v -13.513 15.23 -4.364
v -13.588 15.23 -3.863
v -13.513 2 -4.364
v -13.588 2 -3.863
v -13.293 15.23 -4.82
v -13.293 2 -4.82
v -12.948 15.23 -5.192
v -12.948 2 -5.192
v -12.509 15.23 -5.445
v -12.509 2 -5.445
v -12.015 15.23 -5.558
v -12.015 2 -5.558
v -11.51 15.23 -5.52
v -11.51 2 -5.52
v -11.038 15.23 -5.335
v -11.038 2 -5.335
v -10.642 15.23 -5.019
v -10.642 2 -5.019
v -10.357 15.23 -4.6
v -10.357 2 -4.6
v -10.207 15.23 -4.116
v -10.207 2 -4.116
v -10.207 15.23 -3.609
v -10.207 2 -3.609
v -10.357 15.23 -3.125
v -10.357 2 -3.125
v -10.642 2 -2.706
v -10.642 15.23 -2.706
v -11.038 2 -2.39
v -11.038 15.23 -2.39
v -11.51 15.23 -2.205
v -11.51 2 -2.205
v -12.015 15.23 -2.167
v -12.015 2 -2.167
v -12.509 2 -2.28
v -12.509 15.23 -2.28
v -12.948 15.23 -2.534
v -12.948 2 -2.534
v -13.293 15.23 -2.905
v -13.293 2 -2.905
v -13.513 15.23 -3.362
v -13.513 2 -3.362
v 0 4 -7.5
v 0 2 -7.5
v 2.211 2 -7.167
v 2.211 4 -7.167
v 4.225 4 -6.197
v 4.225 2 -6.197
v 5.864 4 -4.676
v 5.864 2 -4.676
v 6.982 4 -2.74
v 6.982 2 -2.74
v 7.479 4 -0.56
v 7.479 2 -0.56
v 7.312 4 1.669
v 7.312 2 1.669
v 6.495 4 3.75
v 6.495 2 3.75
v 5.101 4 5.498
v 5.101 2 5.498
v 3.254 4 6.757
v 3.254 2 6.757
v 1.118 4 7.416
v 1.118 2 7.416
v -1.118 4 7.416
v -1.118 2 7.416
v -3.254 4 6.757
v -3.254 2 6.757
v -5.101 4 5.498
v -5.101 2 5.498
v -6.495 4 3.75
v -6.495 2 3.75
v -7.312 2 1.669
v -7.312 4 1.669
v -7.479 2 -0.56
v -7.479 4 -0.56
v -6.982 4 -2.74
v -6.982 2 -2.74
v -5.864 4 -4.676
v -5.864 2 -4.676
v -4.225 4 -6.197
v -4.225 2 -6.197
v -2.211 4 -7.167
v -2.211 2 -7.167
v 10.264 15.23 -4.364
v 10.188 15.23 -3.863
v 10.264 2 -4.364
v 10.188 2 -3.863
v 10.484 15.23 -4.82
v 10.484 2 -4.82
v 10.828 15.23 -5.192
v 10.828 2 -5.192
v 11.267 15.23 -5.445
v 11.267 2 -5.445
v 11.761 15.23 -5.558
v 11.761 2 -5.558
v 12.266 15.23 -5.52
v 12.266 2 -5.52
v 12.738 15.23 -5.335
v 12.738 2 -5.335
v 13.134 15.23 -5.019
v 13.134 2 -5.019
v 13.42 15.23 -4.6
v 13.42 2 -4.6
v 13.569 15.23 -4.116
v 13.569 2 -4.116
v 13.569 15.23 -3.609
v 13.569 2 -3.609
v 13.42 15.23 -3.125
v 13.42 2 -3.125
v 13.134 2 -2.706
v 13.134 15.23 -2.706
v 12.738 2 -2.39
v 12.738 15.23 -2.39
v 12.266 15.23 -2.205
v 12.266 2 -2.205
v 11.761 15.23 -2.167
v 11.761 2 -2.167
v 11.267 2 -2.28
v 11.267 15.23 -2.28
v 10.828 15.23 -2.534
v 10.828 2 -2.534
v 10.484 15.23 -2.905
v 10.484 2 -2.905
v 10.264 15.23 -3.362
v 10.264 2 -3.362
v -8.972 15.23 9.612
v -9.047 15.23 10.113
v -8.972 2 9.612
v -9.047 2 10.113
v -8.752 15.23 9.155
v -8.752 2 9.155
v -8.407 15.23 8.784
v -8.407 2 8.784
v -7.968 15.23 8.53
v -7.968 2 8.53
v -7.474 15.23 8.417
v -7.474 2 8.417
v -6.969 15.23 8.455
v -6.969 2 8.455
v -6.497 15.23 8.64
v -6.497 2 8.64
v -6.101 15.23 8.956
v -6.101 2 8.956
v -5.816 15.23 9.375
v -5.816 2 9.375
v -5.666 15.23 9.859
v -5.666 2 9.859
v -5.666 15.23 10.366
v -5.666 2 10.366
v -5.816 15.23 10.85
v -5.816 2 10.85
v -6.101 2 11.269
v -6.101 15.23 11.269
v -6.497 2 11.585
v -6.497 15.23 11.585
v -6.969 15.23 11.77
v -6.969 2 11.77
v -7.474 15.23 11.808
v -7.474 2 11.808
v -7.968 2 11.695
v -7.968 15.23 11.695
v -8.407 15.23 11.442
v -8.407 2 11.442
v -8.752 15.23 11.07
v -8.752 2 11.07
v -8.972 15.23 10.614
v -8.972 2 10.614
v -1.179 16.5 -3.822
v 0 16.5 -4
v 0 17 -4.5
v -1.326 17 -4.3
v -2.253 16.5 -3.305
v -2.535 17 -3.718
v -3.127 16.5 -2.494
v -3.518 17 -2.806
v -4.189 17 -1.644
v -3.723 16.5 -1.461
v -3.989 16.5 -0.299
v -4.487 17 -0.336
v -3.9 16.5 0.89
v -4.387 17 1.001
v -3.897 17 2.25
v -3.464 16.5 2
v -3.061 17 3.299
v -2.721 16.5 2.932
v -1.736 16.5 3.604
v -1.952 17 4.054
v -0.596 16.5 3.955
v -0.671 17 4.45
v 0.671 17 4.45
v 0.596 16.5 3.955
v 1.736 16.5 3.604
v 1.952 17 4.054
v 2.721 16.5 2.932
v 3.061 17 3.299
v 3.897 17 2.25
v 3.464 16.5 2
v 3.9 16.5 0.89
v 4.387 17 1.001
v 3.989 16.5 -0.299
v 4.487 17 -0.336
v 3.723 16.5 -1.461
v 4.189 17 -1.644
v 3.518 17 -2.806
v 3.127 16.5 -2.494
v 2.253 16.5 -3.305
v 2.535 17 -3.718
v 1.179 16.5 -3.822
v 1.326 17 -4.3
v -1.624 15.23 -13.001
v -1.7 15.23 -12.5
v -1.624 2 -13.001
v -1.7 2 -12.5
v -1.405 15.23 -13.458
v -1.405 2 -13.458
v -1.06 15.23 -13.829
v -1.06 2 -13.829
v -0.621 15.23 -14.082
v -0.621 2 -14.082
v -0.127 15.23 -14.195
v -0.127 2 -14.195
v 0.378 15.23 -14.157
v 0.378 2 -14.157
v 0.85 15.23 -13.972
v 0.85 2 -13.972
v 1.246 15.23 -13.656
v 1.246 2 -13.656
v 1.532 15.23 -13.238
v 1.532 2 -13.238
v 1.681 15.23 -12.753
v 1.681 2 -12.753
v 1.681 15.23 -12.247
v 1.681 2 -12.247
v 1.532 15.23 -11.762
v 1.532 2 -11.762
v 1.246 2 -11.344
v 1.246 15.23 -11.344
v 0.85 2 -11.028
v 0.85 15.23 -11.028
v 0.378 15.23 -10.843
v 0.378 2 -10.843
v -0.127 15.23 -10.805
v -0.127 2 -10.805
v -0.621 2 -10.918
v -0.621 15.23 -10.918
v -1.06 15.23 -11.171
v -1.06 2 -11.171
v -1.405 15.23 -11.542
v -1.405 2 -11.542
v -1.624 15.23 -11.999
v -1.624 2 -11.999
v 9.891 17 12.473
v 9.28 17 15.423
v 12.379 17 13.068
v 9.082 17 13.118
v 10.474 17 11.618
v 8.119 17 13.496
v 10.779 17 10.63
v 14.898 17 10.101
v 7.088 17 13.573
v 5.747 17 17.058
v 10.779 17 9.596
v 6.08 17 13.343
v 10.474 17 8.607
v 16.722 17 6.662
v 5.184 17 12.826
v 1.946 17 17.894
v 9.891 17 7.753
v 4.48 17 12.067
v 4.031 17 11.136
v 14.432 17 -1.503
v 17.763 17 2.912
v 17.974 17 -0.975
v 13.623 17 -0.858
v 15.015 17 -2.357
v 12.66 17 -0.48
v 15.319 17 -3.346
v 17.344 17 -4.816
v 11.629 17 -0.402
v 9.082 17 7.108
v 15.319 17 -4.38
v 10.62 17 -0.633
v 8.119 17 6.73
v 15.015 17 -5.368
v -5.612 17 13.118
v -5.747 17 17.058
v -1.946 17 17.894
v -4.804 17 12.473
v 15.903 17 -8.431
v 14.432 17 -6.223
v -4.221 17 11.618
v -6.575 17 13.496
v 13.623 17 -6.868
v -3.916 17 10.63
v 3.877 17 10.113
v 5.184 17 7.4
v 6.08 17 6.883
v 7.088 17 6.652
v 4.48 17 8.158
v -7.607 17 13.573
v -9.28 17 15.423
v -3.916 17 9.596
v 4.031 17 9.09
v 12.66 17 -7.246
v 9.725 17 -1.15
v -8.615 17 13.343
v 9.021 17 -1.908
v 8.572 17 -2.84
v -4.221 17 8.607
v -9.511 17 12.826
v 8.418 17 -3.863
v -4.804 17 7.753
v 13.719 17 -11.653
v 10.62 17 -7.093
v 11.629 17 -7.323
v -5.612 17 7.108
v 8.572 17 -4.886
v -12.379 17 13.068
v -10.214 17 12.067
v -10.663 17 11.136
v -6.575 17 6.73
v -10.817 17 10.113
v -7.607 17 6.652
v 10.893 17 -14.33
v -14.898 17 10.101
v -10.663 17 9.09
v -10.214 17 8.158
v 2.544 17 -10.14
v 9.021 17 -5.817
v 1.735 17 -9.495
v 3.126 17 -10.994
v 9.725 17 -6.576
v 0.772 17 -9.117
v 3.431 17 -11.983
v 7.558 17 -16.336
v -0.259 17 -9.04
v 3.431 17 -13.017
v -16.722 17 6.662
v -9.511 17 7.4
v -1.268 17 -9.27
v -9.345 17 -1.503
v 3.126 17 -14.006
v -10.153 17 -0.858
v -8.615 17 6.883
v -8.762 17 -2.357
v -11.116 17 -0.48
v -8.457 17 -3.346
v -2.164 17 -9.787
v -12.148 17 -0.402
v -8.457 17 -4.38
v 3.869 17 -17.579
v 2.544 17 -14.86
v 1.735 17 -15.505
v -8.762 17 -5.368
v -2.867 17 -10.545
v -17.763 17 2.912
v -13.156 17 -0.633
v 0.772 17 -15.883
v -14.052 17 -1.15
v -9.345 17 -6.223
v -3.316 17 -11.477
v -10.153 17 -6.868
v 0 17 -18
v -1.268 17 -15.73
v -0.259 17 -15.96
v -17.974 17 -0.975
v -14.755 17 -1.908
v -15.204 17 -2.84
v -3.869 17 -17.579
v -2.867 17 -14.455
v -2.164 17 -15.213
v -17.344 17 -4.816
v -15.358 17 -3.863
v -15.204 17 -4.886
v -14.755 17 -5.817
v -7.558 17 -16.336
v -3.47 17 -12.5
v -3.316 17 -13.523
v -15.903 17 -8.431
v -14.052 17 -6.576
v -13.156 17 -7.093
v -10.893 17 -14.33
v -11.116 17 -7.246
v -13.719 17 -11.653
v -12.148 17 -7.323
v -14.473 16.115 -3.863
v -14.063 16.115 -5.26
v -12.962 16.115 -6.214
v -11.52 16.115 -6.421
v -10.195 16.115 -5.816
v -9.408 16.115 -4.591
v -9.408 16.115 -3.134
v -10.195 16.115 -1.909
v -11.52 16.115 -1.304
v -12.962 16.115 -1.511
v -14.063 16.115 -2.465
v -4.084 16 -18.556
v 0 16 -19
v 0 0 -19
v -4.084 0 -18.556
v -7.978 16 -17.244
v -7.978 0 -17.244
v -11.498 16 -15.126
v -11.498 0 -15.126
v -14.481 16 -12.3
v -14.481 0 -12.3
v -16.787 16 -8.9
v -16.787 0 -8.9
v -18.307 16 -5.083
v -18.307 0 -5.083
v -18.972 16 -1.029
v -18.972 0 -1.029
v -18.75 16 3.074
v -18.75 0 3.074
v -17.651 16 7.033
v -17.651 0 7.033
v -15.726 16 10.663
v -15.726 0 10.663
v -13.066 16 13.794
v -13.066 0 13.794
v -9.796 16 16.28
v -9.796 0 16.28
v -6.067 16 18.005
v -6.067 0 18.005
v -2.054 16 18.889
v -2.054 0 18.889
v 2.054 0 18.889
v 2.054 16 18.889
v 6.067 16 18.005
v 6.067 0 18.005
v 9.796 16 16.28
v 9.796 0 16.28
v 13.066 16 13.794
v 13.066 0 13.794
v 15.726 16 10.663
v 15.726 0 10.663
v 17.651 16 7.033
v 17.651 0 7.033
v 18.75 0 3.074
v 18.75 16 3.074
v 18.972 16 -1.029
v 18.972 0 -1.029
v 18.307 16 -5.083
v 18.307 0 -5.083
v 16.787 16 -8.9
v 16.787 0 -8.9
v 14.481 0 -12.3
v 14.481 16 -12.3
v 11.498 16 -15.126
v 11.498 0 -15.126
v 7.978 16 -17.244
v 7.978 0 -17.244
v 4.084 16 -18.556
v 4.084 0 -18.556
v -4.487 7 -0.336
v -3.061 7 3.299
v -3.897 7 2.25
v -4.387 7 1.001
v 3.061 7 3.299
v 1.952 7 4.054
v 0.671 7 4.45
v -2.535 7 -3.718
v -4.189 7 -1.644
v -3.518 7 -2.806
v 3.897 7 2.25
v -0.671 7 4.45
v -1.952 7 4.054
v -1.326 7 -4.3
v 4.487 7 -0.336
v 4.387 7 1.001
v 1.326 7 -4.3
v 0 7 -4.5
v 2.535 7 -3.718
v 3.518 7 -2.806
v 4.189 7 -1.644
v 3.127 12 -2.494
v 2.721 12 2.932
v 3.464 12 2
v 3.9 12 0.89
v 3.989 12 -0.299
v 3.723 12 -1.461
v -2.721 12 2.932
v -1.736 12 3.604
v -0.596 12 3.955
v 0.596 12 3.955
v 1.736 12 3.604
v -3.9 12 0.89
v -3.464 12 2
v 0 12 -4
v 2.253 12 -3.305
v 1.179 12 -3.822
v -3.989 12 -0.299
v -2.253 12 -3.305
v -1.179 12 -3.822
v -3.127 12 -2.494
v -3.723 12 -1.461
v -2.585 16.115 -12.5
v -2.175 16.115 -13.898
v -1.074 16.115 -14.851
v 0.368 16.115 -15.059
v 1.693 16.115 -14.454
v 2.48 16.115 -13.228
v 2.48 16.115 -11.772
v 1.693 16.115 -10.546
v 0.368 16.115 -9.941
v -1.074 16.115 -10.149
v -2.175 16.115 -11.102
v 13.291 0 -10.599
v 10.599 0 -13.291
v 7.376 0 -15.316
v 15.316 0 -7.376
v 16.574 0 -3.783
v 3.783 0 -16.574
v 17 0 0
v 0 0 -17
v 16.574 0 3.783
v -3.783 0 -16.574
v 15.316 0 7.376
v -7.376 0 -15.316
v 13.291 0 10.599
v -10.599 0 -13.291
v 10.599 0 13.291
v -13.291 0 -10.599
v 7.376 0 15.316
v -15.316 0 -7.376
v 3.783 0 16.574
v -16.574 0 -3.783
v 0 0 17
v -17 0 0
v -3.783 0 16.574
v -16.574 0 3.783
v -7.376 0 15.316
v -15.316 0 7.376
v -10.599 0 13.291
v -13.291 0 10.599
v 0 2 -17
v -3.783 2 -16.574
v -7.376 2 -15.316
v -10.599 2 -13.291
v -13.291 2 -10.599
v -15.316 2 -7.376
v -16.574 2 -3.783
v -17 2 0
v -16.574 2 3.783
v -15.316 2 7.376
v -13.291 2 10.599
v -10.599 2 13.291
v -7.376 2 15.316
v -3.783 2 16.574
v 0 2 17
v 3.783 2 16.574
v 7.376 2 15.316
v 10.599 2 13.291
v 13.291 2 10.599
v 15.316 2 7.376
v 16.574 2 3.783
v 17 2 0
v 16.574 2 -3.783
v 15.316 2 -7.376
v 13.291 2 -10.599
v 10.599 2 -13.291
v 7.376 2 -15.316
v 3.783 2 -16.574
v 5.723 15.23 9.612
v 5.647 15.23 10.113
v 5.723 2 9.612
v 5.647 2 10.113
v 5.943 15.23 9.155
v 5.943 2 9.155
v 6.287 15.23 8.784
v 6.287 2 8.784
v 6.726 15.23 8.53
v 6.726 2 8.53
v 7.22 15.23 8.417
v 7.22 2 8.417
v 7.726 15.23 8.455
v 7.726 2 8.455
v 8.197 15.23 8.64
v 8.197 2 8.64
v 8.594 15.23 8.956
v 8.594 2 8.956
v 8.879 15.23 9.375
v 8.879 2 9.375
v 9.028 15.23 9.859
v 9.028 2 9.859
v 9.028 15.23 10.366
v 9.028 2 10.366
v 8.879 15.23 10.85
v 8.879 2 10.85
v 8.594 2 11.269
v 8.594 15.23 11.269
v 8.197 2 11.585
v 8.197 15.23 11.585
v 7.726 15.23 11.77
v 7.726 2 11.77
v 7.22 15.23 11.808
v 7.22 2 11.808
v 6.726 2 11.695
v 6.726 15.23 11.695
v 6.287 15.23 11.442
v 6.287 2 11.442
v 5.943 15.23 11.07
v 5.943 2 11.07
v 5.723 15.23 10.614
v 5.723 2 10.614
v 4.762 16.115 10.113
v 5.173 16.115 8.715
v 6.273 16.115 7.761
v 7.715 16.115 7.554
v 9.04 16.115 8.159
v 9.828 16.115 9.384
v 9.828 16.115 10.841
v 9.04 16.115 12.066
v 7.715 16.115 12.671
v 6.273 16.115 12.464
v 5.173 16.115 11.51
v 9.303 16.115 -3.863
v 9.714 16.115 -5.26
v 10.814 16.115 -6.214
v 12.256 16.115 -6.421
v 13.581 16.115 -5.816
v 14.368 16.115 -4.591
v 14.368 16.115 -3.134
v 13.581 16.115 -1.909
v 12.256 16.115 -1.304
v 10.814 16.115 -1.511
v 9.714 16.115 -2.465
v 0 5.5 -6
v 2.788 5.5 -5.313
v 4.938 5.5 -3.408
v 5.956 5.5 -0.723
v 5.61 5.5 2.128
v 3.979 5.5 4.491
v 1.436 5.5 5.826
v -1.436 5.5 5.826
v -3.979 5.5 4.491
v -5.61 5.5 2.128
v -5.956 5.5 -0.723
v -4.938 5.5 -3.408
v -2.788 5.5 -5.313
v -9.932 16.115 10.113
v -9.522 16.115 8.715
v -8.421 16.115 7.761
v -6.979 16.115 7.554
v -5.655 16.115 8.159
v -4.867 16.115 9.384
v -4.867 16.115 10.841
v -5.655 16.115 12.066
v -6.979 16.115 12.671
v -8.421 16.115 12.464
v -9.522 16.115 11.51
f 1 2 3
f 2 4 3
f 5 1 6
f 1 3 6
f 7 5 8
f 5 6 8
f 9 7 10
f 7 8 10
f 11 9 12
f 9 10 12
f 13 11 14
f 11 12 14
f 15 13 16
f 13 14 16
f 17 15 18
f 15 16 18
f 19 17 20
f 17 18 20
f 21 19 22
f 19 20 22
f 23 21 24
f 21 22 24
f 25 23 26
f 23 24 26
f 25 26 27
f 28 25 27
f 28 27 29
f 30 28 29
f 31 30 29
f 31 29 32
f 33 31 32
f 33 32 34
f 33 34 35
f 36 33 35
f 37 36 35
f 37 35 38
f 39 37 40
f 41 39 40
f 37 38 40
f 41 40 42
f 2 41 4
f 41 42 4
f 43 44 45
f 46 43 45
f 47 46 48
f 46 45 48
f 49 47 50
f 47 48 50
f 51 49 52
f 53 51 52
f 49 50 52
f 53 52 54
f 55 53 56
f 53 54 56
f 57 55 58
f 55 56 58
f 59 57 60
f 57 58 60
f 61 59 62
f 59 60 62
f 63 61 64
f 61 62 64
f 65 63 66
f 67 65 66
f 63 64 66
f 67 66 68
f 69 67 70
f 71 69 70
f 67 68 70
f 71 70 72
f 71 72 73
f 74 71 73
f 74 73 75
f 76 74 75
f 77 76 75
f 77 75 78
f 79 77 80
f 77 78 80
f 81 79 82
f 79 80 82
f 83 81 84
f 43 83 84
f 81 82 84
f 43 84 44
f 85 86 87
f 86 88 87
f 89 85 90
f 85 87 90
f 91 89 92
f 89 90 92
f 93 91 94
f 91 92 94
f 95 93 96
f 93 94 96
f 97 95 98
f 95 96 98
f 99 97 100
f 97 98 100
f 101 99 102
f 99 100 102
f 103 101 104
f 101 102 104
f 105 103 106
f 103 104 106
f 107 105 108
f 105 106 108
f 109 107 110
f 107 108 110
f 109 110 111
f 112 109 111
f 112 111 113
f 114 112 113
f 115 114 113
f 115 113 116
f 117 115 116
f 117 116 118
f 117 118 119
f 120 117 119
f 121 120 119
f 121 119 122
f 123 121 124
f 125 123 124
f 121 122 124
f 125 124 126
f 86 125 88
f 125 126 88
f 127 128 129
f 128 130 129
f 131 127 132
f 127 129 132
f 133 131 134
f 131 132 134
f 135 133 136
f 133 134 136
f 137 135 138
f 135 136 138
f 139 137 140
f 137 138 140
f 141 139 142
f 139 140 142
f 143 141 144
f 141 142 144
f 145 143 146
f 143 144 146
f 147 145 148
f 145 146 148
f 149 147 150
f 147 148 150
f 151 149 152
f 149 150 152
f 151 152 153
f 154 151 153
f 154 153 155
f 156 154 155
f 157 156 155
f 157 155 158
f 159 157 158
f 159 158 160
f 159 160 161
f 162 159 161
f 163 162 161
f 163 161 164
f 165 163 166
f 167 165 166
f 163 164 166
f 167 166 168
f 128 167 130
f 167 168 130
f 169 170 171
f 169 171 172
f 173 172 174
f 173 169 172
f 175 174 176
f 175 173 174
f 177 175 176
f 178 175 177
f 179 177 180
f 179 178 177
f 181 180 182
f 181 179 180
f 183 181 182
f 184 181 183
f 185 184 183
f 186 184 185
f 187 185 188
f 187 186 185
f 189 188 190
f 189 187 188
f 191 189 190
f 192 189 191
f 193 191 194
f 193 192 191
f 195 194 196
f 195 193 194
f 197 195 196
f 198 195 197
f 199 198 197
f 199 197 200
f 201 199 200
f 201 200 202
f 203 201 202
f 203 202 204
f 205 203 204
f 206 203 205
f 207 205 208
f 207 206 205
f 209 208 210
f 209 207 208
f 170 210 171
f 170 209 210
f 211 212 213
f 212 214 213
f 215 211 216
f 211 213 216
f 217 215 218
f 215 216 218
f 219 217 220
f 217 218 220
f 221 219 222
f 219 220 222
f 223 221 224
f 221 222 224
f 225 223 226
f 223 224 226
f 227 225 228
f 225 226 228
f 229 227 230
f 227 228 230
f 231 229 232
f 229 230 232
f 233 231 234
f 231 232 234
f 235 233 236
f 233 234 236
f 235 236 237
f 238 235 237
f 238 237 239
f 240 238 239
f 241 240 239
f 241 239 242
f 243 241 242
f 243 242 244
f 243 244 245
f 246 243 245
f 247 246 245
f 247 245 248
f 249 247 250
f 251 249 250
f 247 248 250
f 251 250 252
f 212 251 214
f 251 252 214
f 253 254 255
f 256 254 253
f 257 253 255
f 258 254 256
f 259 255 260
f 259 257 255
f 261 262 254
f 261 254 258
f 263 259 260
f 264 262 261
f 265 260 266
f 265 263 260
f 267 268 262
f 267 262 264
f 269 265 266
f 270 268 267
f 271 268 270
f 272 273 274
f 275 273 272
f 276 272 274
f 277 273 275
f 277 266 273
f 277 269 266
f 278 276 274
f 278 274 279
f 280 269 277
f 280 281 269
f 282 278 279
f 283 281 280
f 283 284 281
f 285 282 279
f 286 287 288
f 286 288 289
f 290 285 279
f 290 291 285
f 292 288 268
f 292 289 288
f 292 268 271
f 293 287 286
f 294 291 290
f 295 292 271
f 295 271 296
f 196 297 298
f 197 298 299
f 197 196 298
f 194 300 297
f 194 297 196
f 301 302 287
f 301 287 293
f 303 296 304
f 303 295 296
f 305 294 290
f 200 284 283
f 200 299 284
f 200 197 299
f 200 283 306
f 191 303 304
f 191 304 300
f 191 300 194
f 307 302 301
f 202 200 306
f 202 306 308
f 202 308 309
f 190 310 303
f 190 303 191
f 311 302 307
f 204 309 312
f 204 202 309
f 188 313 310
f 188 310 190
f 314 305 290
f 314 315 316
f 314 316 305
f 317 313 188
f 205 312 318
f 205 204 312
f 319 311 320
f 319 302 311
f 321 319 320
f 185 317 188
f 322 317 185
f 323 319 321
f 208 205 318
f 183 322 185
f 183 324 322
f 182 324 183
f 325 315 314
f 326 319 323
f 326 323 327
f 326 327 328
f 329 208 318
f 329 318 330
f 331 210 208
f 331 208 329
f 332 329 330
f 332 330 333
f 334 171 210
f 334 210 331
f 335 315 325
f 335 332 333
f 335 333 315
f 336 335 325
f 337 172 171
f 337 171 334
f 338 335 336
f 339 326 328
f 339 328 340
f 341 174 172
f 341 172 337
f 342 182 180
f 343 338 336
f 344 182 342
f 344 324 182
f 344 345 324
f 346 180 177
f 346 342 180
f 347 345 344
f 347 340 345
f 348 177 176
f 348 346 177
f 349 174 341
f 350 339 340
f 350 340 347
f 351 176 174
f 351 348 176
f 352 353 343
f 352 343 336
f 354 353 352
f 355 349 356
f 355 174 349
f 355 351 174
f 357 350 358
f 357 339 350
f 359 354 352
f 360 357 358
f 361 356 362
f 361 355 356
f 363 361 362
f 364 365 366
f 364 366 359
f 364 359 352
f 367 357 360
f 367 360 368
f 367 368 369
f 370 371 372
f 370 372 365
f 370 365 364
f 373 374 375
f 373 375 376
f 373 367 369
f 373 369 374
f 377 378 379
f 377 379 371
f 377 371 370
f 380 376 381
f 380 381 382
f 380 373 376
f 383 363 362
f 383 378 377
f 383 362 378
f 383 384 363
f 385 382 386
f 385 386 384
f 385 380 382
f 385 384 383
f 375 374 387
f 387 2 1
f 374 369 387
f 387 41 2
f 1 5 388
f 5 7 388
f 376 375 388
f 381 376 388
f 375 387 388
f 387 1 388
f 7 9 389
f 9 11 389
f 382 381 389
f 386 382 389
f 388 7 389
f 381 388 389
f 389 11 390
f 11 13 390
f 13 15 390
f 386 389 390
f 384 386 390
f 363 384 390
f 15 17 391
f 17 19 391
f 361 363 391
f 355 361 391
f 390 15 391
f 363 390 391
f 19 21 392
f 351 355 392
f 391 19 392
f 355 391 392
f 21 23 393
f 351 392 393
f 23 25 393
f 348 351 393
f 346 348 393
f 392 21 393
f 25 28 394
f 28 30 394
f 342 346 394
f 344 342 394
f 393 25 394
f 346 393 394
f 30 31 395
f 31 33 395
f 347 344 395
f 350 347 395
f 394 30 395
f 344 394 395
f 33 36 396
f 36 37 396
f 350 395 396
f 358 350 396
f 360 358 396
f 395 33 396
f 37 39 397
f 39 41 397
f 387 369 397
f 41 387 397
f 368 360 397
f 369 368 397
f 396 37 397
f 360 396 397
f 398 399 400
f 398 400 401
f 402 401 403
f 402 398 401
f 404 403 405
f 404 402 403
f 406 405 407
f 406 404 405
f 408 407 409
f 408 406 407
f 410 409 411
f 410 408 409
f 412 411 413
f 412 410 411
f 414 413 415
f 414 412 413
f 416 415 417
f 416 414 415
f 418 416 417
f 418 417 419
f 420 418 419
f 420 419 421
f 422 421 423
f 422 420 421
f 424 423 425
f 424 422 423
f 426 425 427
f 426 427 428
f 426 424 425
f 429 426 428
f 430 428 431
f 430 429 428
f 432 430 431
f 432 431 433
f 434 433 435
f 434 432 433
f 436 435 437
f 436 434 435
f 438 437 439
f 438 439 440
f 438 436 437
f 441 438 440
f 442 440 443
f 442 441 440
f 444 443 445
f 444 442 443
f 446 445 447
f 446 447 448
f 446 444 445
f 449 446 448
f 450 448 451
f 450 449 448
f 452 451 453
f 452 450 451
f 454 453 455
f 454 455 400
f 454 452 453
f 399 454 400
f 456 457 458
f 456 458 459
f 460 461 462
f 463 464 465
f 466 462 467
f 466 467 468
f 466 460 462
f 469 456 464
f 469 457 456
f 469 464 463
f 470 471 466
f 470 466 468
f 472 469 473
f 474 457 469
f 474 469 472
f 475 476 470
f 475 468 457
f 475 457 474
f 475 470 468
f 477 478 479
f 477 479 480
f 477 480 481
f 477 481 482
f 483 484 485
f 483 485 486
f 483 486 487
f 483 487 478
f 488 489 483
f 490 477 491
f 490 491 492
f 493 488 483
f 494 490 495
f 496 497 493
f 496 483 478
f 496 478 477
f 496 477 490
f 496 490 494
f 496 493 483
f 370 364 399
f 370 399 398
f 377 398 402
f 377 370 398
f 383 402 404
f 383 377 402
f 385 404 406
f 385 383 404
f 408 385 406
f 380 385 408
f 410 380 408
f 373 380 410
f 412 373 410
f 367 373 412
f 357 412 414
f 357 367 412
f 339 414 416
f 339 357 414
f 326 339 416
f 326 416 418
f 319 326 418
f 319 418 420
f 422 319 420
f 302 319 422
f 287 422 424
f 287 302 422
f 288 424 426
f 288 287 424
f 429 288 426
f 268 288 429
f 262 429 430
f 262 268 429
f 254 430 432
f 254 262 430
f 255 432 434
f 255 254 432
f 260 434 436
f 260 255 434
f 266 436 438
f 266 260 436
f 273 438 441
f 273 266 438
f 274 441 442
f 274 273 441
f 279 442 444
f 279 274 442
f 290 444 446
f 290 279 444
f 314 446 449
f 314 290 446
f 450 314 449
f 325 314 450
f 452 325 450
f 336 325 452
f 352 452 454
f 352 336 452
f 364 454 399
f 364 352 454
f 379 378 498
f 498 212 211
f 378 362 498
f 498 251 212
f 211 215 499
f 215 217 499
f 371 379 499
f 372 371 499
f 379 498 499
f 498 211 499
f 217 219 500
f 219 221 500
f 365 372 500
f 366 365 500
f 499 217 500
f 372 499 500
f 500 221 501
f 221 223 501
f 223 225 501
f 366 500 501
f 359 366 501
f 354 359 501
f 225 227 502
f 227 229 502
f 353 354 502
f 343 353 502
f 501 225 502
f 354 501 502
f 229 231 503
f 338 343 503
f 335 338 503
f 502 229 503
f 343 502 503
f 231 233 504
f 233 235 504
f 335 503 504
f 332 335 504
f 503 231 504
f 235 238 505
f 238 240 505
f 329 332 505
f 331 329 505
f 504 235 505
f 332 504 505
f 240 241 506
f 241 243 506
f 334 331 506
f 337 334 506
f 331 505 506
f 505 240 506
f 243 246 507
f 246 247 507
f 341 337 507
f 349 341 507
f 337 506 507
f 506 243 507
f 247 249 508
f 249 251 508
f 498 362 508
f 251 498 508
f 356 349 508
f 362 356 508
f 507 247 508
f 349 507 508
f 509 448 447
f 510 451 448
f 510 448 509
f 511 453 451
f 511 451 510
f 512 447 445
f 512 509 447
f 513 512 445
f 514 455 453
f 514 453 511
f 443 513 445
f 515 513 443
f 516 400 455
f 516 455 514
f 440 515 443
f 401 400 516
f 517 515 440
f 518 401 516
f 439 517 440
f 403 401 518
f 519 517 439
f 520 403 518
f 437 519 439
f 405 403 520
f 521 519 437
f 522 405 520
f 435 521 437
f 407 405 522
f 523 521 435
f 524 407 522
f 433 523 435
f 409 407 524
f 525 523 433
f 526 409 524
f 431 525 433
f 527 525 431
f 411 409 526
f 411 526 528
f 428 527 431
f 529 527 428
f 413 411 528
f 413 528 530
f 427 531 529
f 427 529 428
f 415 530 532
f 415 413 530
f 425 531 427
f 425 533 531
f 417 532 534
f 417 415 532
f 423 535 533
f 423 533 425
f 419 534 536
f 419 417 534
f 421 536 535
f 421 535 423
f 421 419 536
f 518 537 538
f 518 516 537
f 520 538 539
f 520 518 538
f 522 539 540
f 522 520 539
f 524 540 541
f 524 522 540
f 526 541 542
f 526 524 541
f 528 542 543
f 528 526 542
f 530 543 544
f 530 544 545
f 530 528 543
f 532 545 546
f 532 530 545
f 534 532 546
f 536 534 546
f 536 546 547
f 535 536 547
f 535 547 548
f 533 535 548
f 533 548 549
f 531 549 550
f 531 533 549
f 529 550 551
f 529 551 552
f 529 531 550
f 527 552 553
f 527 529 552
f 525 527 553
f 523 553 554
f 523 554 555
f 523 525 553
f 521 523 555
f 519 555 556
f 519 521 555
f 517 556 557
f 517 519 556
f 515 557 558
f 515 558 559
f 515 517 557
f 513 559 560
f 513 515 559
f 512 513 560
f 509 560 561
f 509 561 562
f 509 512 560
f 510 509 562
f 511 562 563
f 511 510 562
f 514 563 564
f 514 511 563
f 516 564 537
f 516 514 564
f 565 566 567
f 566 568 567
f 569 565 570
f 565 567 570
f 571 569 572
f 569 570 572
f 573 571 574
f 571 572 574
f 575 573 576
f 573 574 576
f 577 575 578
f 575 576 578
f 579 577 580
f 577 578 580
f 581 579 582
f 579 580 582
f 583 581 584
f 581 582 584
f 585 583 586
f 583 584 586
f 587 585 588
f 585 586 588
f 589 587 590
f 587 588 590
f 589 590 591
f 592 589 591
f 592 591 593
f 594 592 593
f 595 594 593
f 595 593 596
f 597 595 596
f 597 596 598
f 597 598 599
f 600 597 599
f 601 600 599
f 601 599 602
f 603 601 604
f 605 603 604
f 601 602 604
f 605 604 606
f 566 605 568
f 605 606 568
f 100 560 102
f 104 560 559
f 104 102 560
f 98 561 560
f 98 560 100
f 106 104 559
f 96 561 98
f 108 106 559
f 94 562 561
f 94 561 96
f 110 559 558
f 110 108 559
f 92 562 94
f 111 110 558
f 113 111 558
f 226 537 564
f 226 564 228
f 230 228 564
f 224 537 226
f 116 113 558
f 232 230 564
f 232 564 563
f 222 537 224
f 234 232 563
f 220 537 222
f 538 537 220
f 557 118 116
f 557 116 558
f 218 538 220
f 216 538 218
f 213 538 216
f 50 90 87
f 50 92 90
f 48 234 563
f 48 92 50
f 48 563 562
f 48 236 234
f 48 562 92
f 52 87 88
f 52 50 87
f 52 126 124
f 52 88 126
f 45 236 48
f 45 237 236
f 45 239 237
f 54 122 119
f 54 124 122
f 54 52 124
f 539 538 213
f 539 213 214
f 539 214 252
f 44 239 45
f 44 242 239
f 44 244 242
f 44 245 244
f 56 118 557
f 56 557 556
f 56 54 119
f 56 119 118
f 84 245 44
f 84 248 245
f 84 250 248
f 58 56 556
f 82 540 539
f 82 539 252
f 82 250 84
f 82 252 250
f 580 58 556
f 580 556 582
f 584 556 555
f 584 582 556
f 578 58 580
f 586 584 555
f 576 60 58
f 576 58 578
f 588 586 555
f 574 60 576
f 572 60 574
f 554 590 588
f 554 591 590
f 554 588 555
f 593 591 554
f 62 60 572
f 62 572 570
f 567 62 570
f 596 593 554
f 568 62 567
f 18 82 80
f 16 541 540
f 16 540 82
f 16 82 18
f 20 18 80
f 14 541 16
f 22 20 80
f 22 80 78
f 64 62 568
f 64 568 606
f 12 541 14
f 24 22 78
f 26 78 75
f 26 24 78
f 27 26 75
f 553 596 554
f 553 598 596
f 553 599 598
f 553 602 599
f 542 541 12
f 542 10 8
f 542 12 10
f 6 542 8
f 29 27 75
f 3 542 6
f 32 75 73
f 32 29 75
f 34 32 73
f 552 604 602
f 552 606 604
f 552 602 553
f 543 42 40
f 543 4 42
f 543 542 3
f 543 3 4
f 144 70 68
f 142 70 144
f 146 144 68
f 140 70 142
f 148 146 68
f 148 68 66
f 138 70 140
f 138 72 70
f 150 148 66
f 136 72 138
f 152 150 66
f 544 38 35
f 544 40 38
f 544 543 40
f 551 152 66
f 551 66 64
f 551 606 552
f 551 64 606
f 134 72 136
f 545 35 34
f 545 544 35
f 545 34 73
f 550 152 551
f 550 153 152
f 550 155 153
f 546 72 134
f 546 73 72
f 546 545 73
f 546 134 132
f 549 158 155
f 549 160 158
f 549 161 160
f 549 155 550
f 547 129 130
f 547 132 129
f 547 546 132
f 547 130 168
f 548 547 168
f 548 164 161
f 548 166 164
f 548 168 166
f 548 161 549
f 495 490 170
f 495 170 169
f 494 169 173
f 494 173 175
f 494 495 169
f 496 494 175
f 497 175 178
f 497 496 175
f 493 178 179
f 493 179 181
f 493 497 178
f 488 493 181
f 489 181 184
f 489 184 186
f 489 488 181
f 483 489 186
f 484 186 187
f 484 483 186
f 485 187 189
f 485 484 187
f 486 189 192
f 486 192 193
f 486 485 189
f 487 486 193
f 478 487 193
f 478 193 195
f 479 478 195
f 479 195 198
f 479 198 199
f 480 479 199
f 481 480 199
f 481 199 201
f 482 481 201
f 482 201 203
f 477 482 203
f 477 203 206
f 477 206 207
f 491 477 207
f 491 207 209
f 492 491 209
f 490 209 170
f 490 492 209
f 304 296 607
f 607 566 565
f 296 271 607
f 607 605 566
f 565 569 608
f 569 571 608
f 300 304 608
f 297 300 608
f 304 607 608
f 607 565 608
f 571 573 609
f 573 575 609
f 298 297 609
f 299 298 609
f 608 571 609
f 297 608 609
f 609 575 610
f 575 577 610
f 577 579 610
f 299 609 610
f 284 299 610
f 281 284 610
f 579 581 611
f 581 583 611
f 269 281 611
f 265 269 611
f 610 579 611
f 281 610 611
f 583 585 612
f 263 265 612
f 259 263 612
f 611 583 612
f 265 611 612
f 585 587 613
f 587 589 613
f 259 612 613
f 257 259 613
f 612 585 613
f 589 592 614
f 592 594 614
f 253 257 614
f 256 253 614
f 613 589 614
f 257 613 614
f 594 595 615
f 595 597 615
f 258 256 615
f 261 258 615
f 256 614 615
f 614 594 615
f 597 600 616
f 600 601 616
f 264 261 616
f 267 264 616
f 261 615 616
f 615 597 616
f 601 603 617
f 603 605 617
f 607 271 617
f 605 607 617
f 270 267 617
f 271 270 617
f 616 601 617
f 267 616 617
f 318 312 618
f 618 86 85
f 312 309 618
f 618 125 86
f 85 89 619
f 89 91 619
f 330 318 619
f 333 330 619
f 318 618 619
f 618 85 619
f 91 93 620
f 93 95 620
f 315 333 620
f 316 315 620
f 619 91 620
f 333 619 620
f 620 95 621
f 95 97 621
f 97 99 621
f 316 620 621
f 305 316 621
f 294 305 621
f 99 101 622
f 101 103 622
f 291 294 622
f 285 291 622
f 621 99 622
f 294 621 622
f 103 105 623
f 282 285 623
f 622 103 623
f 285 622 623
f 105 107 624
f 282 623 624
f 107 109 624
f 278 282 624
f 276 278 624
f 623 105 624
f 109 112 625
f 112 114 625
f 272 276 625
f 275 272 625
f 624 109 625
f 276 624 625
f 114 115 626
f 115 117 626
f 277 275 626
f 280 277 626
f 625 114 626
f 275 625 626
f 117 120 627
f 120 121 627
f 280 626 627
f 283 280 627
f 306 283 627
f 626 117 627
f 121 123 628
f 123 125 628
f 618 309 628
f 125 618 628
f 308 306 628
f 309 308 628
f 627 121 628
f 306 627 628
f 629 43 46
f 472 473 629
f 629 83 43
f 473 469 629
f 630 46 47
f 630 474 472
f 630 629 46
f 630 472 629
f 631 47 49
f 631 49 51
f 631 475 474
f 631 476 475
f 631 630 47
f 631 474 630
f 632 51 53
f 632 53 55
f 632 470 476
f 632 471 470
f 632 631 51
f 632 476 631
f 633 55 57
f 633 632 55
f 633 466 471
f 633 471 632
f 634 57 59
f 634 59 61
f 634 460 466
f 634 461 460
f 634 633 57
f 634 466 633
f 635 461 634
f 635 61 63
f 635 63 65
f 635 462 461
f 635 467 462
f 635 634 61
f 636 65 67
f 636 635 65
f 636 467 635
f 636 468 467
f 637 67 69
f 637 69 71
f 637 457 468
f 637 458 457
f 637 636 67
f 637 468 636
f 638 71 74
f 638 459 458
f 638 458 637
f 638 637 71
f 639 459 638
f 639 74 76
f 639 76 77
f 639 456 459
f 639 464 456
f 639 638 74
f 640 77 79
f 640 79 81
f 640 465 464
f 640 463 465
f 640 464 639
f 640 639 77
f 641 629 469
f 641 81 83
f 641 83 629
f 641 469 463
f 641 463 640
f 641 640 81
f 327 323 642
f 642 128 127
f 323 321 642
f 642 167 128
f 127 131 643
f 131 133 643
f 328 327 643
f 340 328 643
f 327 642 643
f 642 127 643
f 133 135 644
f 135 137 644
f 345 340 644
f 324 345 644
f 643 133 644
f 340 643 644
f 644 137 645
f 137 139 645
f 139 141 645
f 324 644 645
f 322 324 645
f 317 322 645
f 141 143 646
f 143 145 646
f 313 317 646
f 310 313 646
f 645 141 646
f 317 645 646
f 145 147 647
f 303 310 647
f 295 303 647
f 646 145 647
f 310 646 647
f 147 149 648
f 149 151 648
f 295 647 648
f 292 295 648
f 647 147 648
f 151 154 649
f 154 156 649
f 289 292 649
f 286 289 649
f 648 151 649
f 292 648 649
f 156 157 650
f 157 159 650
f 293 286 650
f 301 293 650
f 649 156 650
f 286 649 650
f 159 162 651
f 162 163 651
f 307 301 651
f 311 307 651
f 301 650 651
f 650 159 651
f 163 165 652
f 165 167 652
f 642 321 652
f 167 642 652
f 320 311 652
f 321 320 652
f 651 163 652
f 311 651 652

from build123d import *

# Parameters (mm, degrees)
CSK_FOR_M3_HEX_SOCKET_COUNTERSUNK_HEAD_S_D           = 3.4
CSK_FOR_M3_HEX_SOCKET_COUNTERSUNK_HEAD_S_CSINK_D     = 6.94
CSK_FOR_M3_HEX_SOCKET_COUNTERSUNK_HEAD_S_CSINK_ANGLE = 90
SKETCH6_R                                            = 7.5
CUT_EXTRUDE1_DEPTH                                   = 5
CHAMFER1_SIZE                                        = 3
CHAMFER2_SIZE                                        = 1
CHAMFER3_SIZE                                        = 0.5


with BuildPart() as part:
    # Sketch1 → Revolve1 (revolve)
    with BuildSketch(Plane.XY, mode=Mode.PRIVATE) as revolve1_sk:
        Polygon((17, 0), (19, 0), (19, 17), (4, 17), (4, 12), (0, 12), (0, 2), (17, 2), align=None)
    revolve(revolve1_sk.sketch.rotate(Axis((0, 0, 0), (0, 1, 0)), 90), axis=Axis((0, 0, 0), (0, 1, 0)))

    # CSK for M3 Hex Socket Countersunk Head Screw1 (through all)
    with Locations(Plane(origin=(0, 17, 0), x_dir=(1, 0, 0), z_dir=(0, 1, 0))):
        with Locations((-11.888206454, 3.86271243), (0, 12.5), (11.888206454, 3.86271243), (7.347315654, -10.11271243), (-7.347315654, -10.11271243)):
            CounterSinkHole(CSK_FOR_M3_HEX_SOCKET_COUNTERSUNK_HEAD_S_D / 2, CSK_FOR_M3_HEX_SOCKET_COUNTERSUNK_HEAD_S_CSINK_D / 2, counter_sink_angle=CSK_FOR_M3_HEX_SOCKET_COUNTERSUNK_HEAD_S_CSINK_ANGLE)

    # Sketch6 → Cut-Extrude1 (cut)
    with BuildSketch(Plane.XZ.offset(-2)):
        with Locations(Location((0, 0, 0), (0, 0, 270))):
            Circle(SKETCH6_R)
    extrude(amount=-CUT_EXTRUDE1_DEPTH, mode=Mode.SUBTRACT)

    # Chamfer1
    chamfer1_edges = [part.edges().sort_by_distance(p)[0] for p in [
        (0, 7, 7.5),
    ]]
    chamfer(chamfer1_edges, length=CHAMFER1_SIZE)

    # Chamfer2
    chamfer2_edges = [part.edges().sort_by_distance(p)[0] for p in [
        (0, 17, 19),
    ]]
    chamfer(chamfer2_edges, length=CHAMFER2_SIZE)

    # Chamfer3
    chamfer3_edges = [part.edges().sort_by_distance(p)[0] for p in [
        (0, 17, 4),
    ]]
    chamfer(chamfer3_edges, length=CHAMFER3_SIZE)


solid = part.part
